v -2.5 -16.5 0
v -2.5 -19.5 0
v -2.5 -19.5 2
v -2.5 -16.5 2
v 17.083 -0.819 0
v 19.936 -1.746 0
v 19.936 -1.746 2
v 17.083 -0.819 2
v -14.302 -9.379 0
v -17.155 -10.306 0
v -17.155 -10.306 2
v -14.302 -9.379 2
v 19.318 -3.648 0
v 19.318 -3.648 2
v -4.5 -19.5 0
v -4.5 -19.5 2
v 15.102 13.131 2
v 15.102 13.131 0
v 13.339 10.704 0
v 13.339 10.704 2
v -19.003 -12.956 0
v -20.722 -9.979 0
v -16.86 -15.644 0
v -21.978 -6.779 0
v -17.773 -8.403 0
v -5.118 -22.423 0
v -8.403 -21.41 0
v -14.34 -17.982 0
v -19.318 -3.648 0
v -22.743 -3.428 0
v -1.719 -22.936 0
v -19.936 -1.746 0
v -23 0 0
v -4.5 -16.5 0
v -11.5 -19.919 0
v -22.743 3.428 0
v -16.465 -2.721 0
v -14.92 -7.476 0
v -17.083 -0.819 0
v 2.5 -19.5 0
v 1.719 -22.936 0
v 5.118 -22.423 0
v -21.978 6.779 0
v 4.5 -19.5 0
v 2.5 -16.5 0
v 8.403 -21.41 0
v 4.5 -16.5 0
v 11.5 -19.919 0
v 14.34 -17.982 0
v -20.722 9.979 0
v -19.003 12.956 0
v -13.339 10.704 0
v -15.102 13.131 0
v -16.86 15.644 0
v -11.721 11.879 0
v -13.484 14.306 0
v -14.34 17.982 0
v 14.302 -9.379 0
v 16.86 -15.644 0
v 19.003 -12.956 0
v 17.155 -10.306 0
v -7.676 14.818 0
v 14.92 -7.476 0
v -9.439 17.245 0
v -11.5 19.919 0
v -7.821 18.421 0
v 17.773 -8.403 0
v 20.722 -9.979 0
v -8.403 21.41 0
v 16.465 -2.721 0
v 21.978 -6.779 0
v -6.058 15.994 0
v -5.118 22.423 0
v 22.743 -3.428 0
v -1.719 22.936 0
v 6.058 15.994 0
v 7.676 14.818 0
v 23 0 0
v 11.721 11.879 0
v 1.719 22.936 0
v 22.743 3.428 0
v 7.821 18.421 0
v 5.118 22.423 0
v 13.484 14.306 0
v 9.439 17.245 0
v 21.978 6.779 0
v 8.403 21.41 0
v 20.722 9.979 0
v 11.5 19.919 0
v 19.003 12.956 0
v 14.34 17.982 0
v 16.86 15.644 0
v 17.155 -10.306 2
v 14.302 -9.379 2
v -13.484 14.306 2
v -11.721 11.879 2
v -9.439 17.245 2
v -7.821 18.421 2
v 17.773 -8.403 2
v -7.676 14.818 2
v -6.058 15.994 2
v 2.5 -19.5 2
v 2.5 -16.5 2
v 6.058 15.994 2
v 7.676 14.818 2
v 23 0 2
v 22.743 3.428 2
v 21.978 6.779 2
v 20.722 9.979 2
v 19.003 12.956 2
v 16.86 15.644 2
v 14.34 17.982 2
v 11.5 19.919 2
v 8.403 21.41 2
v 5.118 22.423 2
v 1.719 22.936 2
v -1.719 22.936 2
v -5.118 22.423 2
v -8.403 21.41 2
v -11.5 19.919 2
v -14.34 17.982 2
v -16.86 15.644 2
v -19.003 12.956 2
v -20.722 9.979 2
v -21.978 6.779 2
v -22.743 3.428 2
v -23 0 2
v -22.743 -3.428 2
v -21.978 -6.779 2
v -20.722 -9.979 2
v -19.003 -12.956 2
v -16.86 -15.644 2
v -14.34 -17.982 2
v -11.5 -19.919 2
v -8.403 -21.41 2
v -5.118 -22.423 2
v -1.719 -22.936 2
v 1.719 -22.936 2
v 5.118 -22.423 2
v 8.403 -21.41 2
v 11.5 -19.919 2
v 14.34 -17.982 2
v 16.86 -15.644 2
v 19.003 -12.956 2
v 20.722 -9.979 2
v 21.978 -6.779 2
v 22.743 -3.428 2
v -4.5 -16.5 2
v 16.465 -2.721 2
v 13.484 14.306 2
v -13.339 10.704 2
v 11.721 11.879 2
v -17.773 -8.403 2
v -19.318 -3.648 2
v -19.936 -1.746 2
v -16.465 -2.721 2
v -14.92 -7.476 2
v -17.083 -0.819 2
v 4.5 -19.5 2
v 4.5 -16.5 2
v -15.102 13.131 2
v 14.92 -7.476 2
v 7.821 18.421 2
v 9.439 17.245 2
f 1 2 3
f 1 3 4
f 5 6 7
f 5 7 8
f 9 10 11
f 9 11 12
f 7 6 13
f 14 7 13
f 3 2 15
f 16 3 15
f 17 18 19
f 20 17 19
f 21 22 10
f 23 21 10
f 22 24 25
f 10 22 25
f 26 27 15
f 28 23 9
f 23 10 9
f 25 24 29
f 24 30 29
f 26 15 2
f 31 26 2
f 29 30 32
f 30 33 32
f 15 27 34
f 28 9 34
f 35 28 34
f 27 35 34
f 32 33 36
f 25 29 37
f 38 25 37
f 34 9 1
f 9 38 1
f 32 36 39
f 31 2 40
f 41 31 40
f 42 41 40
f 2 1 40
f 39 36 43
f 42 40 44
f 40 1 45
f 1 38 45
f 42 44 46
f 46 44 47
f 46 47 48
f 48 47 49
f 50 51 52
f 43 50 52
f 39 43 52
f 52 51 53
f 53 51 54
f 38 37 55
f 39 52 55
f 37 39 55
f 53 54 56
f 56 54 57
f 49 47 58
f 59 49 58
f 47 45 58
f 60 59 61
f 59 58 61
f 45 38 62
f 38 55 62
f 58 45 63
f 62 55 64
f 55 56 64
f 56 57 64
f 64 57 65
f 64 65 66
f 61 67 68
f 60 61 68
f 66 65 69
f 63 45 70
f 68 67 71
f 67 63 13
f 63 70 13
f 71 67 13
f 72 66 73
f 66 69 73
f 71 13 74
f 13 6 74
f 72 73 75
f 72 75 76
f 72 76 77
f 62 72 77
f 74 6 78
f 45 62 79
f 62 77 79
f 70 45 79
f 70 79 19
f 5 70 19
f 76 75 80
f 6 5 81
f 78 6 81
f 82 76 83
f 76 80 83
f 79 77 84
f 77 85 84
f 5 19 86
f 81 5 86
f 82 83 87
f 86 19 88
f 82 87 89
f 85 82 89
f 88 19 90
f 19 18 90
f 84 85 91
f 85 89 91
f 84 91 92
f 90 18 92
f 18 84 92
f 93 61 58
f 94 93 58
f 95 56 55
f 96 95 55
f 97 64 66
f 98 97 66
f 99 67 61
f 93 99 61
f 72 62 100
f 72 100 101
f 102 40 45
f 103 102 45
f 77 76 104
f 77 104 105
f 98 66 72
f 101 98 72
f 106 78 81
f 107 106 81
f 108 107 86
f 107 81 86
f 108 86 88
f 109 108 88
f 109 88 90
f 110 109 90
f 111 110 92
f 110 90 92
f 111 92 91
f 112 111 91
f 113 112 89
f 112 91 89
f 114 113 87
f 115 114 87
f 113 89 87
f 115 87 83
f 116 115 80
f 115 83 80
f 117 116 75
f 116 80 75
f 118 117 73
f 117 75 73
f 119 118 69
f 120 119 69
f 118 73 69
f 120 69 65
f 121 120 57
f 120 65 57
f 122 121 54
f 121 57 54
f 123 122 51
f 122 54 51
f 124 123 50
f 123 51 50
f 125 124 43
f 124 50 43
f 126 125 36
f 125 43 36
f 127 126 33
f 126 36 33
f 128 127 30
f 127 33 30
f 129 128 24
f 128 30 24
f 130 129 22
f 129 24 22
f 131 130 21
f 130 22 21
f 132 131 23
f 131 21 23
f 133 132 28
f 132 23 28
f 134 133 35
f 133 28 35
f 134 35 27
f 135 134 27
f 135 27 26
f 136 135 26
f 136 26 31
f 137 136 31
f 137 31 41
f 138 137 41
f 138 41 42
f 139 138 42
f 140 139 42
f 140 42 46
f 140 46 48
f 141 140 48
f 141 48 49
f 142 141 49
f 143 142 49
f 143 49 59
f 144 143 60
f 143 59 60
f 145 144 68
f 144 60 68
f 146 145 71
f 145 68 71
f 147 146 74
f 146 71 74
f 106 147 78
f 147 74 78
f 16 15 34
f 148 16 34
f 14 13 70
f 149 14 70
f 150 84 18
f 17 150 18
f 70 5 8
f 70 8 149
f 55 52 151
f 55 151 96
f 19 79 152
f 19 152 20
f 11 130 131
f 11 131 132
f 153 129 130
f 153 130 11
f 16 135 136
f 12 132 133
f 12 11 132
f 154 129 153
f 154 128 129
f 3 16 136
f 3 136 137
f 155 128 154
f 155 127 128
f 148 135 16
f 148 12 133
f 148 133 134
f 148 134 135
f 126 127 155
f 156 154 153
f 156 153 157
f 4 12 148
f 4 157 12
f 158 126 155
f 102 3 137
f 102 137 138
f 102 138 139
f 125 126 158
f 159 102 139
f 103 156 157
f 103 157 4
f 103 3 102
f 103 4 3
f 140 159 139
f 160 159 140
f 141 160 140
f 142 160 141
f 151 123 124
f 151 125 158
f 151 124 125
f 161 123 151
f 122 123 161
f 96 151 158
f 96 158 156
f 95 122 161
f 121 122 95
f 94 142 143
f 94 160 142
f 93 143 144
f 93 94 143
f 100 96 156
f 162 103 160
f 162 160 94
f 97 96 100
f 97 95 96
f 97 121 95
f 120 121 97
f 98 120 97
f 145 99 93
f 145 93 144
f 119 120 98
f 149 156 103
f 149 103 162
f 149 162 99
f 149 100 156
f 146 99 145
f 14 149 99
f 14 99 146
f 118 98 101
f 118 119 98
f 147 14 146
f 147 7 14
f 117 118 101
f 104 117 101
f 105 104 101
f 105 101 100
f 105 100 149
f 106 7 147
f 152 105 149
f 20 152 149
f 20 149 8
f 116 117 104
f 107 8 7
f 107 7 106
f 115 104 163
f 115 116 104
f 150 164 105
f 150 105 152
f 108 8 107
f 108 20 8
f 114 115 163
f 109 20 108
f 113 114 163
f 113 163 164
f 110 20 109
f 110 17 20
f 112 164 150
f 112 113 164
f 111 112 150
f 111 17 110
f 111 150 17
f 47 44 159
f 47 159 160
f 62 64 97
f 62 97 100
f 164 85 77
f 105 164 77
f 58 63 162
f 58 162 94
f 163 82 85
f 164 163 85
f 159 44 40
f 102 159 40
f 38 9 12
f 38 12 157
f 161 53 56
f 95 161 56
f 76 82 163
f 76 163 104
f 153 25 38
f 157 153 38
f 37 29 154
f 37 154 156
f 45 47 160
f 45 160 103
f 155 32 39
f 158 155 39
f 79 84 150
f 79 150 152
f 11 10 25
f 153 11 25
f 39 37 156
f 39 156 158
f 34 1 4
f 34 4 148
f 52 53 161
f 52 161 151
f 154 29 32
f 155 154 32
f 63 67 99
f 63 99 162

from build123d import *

# Parameters (mm, degrees)
SKETCH075_R           = 23
PAD030_DEPTH          = 2
SKETCH076_W           = 3
SKETCH076_H           = 2
POCKET040_DEPTH       = 5
POLARPATTERN004_COUNT = 5


with BuildPart() as part:
    # Sketch075 → Pad030 (new body)
    with BuildSketch(Plane.XY):
        Circle(SKETCH075_R)
    extrude(amount=PAD030_DEPTH)

    # Sketch076 → Pocket040 (cut)
    with BuildSketch(Plane(origin=(0, -18, 0), x_dir=(0, 1, 0), z_dir=(0, 0, 1))):
        with Locations((0, 3.5)):
            Rectangle(SKETCH076_W, SKETCH076_H)
        with Locations((0, -3.5)):
            Rectangle(SKETCH076_W, SKETCH076_H)
    pocket040 = extrude(amount=POCKET040_DEPTH, mode=Mode.SUBTRACT)

    # PolarPattern004: Pocket040 ×5 about axis
    polarpattern004_axis = Axis((0, 0, 0), (0, 0, 1))
    for i in range(1, POLARPATTERN004_COUNT):
        add(pocket040.rotate(polarpattern004_axis, i * 360 / POLARPATTERN004_COUNT), mode=Mode.SUBTRACT)


solid = part.part
